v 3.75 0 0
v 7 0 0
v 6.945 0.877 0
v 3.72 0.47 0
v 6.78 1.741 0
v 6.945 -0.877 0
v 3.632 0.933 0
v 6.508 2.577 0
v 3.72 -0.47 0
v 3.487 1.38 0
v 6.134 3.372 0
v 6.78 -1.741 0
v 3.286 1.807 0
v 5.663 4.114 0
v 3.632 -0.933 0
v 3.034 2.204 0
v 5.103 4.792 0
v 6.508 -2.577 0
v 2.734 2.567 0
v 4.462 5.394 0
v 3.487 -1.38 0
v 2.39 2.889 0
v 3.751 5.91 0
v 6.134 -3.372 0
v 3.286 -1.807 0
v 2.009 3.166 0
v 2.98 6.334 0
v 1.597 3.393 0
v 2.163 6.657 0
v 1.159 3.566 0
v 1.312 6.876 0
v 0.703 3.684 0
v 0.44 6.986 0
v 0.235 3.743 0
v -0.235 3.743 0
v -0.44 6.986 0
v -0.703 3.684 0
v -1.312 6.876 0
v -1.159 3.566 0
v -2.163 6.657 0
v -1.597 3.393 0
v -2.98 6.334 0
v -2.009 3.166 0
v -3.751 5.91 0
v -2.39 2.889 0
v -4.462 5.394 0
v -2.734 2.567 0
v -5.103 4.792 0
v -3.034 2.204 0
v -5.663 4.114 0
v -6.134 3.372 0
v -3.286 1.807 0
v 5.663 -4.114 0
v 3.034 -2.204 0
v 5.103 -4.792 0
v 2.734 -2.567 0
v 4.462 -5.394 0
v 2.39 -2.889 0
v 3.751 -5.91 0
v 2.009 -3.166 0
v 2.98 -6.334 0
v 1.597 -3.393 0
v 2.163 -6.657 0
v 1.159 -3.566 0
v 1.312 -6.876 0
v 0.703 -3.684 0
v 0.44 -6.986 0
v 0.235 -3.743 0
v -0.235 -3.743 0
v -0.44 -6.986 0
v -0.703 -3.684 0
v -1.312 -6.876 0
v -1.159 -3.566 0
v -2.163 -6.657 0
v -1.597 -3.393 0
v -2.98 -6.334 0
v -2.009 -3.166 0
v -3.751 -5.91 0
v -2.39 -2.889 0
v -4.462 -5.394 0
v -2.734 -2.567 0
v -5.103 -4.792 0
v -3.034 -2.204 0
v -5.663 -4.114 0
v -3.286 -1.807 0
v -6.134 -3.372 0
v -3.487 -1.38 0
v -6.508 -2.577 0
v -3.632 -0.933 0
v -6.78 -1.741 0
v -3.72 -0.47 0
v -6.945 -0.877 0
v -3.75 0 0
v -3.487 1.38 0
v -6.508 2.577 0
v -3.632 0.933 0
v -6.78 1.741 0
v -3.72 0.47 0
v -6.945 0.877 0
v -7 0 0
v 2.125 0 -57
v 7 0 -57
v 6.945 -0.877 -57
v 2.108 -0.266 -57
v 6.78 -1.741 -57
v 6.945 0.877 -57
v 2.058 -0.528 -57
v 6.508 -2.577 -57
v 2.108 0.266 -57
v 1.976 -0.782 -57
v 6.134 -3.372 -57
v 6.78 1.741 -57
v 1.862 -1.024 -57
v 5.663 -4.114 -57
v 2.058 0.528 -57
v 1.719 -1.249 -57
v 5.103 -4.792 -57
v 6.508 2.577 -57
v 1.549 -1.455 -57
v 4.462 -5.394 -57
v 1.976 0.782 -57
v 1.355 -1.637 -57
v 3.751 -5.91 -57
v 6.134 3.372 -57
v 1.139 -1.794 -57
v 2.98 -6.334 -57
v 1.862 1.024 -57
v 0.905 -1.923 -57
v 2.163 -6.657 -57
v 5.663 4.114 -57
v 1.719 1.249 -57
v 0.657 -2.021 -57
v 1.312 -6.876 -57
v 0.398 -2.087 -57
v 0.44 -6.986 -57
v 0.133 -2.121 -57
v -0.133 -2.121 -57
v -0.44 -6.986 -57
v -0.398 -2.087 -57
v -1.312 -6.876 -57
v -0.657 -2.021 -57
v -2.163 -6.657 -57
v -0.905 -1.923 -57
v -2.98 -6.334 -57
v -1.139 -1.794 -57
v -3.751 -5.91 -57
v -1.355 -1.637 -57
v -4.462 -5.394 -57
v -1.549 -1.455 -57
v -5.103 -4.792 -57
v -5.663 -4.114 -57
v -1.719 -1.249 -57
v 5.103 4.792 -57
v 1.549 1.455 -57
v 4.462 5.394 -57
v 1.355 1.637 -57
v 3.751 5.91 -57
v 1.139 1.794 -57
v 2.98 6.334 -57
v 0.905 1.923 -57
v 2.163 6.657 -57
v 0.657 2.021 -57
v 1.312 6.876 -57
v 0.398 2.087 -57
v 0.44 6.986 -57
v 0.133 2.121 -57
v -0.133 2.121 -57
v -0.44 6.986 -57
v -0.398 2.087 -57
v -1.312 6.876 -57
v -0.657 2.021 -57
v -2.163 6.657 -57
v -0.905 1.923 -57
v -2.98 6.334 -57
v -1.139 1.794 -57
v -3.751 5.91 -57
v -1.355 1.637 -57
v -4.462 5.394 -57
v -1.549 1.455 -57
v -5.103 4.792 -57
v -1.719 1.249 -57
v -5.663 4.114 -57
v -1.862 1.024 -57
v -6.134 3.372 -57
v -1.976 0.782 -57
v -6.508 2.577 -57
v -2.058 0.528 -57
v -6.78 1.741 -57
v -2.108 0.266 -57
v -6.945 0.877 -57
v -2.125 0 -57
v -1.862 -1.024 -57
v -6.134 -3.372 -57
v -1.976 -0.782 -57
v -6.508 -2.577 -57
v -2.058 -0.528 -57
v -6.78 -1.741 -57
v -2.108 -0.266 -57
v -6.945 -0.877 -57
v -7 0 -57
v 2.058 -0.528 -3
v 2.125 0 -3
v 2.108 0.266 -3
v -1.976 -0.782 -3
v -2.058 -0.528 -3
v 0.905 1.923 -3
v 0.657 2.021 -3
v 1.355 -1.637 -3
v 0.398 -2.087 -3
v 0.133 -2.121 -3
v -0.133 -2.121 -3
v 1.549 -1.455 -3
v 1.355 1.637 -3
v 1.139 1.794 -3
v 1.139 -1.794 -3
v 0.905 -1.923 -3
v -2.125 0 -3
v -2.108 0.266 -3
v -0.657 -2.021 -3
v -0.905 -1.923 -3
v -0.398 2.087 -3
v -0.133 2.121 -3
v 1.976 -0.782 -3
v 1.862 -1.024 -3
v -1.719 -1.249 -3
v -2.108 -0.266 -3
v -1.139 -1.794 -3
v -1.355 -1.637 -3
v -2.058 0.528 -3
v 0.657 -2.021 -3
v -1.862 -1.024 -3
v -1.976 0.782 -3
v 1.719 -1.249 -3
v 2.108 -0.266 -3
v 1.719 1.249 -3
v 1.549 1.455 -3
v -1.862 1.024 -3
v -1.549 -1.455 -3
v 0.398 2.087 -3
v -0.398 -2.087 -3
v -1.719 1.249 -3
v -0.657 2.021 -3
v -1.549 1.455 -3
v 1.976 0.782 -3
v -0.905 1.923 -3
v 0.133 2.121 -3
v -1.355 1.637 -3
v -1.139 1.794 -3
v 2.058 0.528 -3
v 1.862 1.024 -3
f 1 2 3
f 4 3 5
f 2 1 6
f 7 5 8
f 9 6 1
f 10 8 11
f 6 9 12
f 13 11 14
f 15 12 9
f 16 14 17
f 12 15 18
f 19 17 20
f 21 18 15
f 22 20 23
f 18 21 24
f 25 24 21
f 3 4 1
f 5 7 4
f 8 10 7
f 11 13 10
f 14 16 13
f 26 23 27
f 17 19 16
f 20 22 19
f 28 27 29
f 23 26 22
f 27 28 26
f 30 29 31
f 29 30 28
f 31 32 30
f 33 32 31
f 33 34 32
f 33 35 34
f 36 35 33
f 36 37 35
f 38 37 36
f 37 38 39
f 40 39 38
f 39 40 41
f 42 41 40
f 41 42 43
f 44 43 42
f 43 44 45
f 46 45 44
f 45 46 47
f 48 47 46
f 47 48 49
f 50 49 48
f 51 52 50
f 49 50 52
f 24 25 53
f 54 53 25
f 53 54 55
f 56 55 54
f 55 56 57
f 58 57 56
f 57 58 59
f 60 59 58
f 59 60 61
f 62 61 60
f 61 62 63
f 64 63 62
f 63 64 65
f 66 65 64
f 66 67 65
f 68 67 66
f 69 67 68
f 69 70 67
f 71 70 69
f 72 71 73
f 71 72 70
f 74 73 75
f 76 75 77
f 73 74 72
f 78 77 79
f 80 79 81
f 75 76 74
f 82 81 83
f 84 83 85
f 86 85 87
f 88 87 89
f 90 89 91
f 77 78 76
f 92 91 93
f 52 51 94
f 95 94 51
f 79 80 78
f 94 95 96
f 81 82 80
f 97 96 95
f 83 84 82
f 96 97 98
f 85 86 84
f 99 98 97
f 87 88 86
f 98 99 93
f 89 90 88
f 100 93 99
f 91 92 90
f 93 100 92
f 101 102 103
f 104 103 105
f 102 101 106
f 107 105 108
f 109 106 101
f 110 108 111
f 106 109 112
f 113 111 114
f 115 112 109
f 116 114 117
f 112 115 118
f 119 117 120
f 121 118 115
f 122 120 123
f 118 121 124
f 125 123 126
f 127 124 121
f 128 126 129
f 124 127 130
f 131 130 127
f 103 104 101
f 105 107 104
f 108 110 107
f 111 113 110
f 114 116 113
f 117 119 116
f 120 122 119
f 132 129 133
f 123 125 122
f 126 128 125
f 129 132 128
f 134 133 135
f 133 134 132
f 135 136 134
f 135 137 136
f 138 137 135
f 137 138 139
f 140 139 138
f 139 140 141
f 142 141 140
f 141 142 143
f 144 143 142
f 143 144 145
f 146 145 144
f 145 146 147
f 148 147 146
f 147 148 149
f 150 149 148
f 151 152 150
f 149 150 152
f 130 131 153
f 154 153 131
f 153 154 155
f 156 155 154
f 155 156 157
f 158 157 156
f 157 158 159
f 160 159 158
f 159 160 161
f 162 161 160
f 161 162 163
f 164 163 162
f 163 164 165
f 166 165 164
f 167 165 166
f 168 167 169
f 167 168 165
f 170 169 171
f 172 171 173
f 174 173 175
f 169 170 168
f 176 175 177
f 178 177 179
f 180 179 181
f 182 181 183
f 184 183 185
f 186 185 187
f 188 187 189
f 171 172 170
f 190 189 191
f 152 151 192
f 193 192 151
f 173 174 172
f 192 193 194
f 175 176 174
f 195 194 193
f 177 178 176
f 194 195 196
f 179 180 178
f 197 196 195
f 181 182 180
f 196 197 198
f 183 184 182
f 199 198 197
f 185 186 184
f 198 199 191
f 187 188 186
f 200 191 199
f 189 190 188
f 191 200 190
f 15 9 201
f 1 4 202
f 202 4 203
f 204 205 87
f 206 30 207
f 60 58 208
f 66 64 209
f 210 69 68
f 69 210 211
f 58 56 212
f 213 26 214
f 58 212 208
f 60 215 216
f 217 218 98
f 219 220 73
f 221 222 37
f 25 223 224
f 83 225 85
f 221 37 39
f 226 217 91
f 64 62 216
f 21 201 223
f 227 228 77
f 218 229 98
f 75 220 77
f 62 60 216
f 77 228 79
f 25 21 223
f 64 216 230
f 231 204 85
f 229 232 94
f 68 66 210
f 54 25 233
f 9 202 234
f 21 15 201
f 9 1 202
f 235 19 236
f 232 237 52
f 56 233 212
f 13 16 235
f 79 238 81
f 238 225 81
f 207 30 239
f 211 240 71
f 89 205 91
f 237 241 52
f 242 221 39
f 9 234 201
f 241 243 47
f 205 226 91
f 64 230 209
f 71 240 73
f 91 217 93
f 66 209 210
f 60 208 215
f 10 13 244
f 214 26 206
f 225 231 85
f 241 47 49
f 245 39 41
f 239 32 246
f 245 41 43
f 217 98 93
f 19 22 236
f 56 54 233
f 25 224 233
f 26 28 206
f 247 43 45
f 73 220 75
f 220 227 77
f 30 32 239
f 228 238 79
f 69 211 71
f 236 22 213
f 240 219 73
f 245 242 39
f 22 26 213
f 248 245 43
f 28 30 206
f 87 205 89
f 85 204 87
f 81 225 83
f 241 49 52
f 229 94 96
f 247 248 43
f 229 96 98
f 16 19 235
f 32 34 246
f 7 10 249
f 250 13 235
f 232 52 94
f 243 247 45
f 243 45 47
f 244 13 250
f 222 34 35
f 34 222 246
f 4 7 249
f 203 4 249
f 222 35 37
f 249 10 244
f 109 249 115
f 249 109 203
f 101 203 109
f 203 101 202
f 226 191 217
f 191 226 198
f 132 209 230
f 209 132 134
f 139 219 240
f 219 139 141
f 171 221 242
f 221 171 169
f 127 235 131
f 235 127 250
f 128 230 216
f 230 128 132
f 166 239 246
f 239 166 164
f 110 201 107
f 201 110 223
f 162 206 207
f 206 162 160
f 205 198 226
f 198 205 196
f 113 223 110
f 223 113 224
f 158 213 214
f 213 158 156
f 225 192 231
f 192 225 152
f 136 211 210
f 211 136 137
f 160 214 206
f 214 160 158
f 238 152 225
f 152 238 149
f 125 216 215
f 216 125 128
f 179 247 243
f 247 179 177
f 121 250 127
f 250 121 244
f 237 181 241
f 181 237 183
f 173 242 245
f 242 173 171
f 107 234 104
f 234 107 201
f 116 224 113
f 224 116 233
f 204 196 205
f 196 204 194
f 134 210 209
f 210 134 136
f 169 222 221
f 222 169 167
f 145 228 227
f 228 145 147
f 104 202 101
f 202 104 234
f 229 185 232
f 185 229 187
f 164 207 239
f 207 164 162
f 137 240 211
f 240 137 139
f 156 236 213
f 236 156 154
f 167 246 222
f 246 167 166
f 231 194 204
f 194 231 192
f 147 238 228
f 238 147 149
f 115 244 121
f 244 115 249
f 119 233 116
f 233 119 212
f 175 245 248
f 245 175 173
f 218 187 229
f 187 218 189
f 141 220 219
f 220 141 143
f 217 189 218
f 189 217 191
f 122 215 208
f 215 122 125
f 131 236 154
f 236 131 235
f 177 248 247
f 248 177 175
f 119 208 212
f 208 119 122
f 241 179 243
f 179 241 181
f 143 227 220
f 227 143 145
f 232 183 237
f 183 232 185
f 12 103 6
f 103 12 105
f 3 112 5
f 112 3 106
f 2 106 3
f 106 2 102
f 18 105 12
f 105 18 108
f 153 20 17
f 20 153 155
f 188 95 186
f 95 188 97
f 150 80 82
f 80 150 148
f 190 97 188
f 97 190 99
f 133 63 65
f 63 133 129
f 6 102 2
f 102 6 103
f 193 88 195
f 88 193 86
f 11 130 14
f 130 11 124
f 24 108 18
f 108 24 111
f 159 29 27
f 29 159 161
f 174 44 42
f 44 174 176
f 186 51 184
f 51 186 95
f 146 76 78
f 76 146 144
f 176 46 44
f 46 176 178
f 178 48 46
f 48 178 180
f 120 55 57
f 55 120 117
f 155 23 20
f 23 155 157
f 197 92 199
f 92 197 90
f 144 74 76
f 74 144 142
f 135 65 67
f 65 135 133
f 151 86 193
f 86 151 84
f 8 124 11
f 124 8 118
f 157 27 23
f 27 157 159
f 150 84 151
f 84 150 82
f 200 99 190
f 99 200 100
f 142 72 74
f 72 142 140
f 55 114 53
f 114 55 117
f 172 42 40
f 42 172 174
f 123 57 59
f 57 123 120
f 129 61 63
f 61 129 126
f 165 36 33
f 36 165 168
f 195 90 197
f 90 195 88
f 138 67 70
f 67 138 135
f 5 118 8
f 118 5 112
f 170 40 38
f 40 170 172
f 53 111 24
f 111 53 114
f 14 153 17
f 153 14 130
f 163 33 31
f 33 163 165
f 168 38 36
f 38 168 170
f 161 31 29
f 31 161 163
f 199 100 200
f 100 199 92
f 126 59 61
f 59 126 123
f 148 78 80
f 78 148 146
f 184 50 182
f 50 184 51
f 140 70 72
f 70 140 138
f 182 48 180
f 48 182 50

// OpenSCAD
$fn = 50;


difference() {
	union() {
		translate(v = [0, 0, -57.0000000000]) {
			cylinder(h = 57, r = 7.0000000000);
		}
		cylinder(h = 0, r = 17.0000000000);
	}
	union() {
		translate(v = [0, 0, 0]) {
			rotate(a = [0, 0, 0]) {
				difference() {
					union() {
						#translate(v = [0, 0, -57.0000000000]) {
							cylinder(h = 57, r = 2.0000000000);
						}
						#translate(v = [0, 0, -3]) {
							cylinder(h = 3, r1 = 2.1250000000, r2 = 3.7500000000);
						}
						#translate(v = [0, 0, -57.0000000000]) {
							cylinder(h = 57, r = 2.1250000000);
						}
						#translate(v = [0, 0, -57.0000000000]) {
							cylinder(h = 57, r = 2.0000000000);
						}
					}
					union();
				}
			}
		}
	}
}
